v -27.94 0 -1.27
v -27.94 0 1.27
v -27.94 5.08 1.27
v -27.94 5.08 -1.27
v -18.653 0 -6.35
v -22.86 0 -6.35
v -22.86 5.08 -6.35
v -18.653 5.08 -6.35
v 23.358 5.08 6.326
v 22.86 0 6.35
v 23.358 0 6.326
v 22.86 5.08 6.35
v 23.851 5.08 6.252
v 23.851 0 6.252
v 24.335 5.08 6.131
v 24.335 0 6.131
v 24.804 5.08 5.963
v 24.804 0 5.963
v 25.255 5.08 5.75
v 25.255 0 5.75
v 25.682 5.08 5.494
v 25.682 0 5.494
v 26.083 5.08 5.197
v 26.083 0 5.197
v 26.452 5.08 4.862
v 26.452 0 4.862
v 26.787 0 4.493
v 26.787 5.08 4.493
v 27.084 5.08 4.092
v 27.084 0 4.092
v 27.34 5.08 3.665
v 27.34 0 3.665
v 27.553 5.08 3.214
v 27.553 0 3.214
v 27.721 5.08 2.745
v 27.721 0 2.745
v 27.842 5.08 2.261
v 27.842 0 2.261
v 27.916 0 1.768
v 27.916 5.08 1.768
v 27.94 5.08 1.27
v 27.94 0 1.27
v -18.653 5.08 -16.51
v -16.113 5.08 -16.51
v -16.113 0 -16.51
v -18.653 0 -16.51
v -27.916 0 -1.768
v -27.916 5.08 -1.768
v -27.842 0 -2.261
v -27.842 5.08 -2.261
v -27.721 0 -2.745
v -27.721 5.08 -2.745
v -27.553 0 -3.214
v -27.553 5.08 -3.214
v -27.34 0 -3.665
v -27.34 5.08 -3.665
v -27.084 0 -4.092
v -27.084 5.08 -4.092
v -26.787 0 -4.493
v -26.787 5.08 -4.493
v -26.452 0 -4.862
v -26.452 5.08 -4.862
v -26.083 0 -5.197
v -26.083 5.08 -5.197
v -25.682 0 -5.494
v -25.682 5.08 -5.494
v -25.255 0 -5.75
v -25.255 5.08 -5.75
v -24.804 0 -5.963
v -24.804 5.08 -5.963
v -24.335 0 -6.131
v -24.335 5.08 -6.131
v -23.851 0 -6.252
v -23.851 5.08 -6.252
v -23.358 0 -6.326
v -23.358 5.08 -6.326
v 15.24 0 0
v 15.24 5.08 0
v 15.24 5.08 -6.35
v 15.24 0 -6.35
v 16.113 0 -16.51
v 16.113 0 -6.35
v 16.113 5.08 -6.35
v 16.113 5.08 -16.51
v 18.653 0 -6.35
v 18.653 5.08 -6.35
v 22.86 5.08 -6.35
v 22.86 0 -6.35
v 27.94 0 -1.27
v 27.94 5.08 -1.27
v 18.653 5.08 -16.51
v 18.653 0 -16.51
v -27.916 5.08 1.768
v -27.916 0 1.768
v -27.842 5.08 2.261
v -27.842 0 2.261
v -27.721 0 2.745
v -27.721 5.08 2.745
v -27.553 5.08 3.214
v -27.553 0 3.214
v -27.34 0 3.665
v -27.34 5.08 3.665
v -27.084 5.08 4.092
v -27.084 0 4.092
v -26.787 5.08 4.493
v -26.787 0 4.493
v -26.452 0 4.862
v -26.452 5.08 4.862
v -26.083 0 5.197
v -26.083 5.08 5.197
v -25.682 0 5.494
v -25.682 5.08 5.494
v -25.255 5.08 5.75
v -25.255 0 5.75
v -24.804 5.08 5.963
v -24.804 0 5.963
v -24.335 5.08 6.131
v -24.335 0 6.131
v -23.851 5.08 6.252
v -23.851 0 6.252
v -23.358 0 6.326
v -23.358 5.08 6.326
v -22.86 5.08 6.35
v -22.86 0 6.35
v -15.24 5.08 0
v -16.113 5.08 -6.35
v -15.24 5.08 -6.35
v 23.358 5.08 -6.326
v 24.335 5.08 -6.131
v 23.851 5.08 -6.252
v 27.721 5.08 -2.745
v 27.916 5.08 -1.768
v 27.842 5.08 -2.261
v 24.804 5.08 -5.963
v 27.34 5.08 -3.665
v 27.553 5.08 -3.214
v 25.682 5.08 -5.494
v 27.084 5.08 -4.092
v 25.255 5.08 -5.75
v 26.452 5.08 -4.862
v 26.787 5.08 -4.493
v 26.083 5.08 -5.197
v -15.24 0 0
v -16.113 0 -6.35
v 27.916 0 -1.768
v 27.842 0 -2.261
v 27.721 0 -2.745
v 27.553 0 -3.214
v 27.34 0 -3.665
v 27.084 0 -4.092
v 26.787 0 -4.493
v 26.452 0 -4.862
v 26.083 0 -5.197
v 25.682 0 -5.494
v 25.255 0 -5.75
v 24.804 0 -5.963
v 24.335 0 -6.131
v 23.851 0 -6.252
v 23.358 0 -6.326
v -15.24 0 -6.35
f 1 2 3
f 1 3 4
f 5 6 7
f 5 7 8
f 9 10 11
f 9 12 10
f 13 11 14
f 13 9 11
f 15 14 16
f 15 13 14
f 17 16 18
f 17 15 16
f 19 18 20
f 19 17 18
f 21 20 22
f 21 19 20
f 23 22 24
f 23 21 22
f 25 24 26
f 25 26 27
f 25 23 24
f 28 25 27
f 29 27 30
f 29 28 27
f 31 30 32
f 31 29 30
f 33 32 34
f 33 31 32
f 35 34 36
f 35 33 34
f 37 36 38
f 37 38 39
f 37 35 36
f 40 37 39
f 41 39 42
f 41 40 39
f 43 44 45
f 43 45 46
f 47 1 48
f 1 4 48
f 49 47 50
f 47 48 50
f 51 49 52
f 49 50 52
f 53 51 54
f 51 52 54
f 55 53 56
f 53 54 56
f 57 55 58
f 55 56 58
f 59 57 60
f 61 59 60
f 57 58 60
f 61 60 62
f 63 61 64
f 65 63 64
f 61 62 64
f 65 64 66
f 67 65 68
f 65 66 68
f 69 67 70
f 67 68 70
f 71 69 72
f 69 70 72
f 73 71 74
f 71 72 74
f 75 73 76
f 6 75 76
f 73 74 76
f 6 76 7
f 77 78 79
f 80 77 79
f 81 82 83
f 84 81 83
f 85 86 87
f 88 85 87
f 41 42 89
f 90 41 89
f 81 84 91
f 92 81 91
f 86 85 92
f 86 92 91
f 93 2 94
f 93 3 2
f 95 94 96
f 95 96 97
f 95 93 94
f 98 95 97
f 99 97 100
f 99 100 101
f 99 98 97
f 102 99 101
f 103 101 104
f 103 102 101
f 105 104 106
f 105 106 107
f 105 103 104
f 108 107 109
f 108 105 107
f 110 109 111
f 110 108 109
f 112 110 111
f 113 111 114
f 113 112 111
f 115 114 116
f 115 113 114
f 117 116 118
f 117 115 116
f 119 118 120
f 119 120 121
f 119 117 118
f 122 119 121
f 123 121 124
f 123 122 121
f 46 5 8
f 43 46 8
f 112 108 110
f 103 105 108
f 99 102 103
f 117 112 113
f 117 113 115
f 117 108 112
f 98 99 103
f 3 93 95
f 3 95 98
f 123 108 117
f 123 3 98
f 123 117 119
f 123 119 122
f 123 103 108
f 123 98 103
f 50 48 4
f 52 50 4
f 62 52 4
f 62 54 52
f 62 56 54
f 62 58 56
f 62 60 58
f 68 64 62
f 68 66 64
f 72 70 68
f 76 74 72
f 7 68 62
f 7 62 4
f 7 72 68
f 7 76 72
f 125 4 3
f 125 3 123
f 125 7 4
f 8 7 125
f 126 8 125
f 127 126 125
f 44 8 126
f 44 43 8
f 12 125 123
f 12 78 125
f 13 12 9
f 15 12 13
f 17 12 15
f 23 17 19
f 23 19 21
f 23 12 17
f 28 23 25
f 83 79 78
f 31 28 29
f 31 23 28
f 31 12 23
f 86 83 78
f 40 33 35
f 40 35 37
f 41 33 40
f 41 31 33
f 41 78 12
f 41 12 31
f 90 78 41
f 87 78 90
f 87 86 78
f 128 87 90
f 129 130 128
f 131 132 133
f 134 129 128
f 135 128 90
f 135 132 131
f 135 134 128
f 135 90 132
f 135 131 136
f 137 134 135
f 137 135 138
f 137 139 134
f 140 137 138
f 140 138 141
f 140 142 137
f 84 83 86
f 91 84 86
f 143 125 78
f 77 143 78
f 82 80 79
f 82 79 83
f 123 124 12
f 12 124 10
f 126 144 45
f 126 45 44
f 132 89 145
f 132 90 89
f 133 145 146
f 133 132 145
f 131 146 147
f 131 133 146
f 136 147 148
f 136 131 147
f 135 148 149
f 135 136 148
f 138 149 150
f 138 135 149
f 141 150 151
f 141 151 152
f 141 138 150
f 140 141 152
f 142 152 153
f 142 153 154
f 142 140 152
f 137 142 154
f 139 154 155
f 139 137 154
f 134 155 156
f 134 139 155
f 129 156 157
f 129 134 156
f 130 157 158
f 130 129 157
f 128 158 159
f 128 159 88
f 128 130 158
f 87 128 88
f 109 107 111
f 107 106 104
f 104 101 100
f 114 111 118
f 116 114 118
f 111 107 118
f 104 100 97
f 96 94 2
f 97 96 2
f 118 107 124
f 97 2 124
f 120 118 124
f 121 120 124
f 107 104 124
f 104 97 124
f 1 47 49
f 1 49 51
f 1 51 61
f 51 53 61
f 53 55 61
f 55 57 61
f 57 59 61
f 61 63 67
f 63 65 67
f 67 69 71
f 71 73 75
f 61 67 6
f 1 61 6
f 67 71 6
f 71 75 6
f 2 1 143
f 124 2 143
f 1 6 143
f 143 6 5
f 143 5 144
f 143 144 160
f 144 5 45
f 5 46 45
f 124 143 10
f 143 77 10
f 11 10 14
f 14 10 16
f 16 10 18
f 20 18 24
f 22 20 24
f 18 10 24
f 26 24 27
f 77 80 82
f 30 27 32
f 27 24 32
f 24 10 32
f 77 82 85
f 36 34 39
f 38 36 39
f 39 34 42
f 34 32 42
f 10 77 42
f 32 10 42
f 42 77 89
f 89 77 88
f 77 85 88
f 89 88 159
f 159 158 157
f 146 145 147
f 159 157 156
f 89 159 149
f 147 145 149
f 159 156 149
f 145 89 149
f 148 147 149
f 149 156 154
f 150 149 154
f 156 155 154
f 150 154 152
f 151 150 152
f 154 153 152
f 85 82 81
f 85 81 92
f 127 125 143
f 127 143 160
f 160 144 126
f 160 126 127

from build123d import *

# Parameters (mm, degrees)
SKETCH1_W           = 55.88
SKETCH1_H           = 12.7
BOSS_EXTRUDE1_DEPTH = 5.08
SKETCH2_W           = 30.48
SKETCH2_H           = 6.35
CUT_EXTRUDE1_DEPTH  = 5.08
FILLET1_R           = 5.08
SKETCH3_W           = 2.54
SKETCH3_H           = 5.08
BOSS_EXTRUDE2_DEPTH = 10.16


with BuildPart() as part:
    # Sketch1 → Boss-Extrude1 (new body)
    with BuildSketch(Plane(origin=(0, 0, 0), x_dir=(1, 0, 0), z_dir=(0, 1, 0))):
        Rectangle(SKETCH1_W, SKETCH1_H)
    extrude(amount=BOSS_EXTRUDE1_DEPTH)

    # Sketch2 → Cut-Extrude1 (cut)
    with BuildSketch(Plane(origin=(0, 5.08, 0), x_dir=(1, 0, 0), z_dir=(0, 1, 0))):
        with Locations((0, 3.175)):
            Rectangle(SKETCH2_W, SKETCH2_H)
    extrude(amount=-CUT_EXTRUDE1_DEPTH, mode=Mode.SUBTRACT)

    # Fillet1
    fillet1_edges = [part.edges().sort_by_distance(p)[0] for p in [
        (27.94, 2.54, 6.35),
        (-27.94, 2.54, 6.35),
        (-27.94, 2.54, -6.35),
        (27.94, 2.54, -6.35),
    ]]
    fillet(fillet1_edges, radius=FILLET1_R)

    # Sketch3 → Boss-Extrude2 (add)
    with BuildSketch(Plane(origin=(0, 0, -6.35), x_dir=(-1, 0, 0), z_dir=(0, 0, -1))):
        with Locations((17.382512253, 2.54)):
            Rectangle(SKETCH3_W, SKETCH3_H)
    boss_extrude2 = extrude(amount=BOSS_EXTRUDE2_DEPTH)

    # Mirror1: Boss-Extrude2 across plane
    add(boss_extrude2.mirror(Plane(origin=(0, 0, 0), x_dir=(0, 0, 1), z_dir=(1, 0, 0))))


solid = part.part
